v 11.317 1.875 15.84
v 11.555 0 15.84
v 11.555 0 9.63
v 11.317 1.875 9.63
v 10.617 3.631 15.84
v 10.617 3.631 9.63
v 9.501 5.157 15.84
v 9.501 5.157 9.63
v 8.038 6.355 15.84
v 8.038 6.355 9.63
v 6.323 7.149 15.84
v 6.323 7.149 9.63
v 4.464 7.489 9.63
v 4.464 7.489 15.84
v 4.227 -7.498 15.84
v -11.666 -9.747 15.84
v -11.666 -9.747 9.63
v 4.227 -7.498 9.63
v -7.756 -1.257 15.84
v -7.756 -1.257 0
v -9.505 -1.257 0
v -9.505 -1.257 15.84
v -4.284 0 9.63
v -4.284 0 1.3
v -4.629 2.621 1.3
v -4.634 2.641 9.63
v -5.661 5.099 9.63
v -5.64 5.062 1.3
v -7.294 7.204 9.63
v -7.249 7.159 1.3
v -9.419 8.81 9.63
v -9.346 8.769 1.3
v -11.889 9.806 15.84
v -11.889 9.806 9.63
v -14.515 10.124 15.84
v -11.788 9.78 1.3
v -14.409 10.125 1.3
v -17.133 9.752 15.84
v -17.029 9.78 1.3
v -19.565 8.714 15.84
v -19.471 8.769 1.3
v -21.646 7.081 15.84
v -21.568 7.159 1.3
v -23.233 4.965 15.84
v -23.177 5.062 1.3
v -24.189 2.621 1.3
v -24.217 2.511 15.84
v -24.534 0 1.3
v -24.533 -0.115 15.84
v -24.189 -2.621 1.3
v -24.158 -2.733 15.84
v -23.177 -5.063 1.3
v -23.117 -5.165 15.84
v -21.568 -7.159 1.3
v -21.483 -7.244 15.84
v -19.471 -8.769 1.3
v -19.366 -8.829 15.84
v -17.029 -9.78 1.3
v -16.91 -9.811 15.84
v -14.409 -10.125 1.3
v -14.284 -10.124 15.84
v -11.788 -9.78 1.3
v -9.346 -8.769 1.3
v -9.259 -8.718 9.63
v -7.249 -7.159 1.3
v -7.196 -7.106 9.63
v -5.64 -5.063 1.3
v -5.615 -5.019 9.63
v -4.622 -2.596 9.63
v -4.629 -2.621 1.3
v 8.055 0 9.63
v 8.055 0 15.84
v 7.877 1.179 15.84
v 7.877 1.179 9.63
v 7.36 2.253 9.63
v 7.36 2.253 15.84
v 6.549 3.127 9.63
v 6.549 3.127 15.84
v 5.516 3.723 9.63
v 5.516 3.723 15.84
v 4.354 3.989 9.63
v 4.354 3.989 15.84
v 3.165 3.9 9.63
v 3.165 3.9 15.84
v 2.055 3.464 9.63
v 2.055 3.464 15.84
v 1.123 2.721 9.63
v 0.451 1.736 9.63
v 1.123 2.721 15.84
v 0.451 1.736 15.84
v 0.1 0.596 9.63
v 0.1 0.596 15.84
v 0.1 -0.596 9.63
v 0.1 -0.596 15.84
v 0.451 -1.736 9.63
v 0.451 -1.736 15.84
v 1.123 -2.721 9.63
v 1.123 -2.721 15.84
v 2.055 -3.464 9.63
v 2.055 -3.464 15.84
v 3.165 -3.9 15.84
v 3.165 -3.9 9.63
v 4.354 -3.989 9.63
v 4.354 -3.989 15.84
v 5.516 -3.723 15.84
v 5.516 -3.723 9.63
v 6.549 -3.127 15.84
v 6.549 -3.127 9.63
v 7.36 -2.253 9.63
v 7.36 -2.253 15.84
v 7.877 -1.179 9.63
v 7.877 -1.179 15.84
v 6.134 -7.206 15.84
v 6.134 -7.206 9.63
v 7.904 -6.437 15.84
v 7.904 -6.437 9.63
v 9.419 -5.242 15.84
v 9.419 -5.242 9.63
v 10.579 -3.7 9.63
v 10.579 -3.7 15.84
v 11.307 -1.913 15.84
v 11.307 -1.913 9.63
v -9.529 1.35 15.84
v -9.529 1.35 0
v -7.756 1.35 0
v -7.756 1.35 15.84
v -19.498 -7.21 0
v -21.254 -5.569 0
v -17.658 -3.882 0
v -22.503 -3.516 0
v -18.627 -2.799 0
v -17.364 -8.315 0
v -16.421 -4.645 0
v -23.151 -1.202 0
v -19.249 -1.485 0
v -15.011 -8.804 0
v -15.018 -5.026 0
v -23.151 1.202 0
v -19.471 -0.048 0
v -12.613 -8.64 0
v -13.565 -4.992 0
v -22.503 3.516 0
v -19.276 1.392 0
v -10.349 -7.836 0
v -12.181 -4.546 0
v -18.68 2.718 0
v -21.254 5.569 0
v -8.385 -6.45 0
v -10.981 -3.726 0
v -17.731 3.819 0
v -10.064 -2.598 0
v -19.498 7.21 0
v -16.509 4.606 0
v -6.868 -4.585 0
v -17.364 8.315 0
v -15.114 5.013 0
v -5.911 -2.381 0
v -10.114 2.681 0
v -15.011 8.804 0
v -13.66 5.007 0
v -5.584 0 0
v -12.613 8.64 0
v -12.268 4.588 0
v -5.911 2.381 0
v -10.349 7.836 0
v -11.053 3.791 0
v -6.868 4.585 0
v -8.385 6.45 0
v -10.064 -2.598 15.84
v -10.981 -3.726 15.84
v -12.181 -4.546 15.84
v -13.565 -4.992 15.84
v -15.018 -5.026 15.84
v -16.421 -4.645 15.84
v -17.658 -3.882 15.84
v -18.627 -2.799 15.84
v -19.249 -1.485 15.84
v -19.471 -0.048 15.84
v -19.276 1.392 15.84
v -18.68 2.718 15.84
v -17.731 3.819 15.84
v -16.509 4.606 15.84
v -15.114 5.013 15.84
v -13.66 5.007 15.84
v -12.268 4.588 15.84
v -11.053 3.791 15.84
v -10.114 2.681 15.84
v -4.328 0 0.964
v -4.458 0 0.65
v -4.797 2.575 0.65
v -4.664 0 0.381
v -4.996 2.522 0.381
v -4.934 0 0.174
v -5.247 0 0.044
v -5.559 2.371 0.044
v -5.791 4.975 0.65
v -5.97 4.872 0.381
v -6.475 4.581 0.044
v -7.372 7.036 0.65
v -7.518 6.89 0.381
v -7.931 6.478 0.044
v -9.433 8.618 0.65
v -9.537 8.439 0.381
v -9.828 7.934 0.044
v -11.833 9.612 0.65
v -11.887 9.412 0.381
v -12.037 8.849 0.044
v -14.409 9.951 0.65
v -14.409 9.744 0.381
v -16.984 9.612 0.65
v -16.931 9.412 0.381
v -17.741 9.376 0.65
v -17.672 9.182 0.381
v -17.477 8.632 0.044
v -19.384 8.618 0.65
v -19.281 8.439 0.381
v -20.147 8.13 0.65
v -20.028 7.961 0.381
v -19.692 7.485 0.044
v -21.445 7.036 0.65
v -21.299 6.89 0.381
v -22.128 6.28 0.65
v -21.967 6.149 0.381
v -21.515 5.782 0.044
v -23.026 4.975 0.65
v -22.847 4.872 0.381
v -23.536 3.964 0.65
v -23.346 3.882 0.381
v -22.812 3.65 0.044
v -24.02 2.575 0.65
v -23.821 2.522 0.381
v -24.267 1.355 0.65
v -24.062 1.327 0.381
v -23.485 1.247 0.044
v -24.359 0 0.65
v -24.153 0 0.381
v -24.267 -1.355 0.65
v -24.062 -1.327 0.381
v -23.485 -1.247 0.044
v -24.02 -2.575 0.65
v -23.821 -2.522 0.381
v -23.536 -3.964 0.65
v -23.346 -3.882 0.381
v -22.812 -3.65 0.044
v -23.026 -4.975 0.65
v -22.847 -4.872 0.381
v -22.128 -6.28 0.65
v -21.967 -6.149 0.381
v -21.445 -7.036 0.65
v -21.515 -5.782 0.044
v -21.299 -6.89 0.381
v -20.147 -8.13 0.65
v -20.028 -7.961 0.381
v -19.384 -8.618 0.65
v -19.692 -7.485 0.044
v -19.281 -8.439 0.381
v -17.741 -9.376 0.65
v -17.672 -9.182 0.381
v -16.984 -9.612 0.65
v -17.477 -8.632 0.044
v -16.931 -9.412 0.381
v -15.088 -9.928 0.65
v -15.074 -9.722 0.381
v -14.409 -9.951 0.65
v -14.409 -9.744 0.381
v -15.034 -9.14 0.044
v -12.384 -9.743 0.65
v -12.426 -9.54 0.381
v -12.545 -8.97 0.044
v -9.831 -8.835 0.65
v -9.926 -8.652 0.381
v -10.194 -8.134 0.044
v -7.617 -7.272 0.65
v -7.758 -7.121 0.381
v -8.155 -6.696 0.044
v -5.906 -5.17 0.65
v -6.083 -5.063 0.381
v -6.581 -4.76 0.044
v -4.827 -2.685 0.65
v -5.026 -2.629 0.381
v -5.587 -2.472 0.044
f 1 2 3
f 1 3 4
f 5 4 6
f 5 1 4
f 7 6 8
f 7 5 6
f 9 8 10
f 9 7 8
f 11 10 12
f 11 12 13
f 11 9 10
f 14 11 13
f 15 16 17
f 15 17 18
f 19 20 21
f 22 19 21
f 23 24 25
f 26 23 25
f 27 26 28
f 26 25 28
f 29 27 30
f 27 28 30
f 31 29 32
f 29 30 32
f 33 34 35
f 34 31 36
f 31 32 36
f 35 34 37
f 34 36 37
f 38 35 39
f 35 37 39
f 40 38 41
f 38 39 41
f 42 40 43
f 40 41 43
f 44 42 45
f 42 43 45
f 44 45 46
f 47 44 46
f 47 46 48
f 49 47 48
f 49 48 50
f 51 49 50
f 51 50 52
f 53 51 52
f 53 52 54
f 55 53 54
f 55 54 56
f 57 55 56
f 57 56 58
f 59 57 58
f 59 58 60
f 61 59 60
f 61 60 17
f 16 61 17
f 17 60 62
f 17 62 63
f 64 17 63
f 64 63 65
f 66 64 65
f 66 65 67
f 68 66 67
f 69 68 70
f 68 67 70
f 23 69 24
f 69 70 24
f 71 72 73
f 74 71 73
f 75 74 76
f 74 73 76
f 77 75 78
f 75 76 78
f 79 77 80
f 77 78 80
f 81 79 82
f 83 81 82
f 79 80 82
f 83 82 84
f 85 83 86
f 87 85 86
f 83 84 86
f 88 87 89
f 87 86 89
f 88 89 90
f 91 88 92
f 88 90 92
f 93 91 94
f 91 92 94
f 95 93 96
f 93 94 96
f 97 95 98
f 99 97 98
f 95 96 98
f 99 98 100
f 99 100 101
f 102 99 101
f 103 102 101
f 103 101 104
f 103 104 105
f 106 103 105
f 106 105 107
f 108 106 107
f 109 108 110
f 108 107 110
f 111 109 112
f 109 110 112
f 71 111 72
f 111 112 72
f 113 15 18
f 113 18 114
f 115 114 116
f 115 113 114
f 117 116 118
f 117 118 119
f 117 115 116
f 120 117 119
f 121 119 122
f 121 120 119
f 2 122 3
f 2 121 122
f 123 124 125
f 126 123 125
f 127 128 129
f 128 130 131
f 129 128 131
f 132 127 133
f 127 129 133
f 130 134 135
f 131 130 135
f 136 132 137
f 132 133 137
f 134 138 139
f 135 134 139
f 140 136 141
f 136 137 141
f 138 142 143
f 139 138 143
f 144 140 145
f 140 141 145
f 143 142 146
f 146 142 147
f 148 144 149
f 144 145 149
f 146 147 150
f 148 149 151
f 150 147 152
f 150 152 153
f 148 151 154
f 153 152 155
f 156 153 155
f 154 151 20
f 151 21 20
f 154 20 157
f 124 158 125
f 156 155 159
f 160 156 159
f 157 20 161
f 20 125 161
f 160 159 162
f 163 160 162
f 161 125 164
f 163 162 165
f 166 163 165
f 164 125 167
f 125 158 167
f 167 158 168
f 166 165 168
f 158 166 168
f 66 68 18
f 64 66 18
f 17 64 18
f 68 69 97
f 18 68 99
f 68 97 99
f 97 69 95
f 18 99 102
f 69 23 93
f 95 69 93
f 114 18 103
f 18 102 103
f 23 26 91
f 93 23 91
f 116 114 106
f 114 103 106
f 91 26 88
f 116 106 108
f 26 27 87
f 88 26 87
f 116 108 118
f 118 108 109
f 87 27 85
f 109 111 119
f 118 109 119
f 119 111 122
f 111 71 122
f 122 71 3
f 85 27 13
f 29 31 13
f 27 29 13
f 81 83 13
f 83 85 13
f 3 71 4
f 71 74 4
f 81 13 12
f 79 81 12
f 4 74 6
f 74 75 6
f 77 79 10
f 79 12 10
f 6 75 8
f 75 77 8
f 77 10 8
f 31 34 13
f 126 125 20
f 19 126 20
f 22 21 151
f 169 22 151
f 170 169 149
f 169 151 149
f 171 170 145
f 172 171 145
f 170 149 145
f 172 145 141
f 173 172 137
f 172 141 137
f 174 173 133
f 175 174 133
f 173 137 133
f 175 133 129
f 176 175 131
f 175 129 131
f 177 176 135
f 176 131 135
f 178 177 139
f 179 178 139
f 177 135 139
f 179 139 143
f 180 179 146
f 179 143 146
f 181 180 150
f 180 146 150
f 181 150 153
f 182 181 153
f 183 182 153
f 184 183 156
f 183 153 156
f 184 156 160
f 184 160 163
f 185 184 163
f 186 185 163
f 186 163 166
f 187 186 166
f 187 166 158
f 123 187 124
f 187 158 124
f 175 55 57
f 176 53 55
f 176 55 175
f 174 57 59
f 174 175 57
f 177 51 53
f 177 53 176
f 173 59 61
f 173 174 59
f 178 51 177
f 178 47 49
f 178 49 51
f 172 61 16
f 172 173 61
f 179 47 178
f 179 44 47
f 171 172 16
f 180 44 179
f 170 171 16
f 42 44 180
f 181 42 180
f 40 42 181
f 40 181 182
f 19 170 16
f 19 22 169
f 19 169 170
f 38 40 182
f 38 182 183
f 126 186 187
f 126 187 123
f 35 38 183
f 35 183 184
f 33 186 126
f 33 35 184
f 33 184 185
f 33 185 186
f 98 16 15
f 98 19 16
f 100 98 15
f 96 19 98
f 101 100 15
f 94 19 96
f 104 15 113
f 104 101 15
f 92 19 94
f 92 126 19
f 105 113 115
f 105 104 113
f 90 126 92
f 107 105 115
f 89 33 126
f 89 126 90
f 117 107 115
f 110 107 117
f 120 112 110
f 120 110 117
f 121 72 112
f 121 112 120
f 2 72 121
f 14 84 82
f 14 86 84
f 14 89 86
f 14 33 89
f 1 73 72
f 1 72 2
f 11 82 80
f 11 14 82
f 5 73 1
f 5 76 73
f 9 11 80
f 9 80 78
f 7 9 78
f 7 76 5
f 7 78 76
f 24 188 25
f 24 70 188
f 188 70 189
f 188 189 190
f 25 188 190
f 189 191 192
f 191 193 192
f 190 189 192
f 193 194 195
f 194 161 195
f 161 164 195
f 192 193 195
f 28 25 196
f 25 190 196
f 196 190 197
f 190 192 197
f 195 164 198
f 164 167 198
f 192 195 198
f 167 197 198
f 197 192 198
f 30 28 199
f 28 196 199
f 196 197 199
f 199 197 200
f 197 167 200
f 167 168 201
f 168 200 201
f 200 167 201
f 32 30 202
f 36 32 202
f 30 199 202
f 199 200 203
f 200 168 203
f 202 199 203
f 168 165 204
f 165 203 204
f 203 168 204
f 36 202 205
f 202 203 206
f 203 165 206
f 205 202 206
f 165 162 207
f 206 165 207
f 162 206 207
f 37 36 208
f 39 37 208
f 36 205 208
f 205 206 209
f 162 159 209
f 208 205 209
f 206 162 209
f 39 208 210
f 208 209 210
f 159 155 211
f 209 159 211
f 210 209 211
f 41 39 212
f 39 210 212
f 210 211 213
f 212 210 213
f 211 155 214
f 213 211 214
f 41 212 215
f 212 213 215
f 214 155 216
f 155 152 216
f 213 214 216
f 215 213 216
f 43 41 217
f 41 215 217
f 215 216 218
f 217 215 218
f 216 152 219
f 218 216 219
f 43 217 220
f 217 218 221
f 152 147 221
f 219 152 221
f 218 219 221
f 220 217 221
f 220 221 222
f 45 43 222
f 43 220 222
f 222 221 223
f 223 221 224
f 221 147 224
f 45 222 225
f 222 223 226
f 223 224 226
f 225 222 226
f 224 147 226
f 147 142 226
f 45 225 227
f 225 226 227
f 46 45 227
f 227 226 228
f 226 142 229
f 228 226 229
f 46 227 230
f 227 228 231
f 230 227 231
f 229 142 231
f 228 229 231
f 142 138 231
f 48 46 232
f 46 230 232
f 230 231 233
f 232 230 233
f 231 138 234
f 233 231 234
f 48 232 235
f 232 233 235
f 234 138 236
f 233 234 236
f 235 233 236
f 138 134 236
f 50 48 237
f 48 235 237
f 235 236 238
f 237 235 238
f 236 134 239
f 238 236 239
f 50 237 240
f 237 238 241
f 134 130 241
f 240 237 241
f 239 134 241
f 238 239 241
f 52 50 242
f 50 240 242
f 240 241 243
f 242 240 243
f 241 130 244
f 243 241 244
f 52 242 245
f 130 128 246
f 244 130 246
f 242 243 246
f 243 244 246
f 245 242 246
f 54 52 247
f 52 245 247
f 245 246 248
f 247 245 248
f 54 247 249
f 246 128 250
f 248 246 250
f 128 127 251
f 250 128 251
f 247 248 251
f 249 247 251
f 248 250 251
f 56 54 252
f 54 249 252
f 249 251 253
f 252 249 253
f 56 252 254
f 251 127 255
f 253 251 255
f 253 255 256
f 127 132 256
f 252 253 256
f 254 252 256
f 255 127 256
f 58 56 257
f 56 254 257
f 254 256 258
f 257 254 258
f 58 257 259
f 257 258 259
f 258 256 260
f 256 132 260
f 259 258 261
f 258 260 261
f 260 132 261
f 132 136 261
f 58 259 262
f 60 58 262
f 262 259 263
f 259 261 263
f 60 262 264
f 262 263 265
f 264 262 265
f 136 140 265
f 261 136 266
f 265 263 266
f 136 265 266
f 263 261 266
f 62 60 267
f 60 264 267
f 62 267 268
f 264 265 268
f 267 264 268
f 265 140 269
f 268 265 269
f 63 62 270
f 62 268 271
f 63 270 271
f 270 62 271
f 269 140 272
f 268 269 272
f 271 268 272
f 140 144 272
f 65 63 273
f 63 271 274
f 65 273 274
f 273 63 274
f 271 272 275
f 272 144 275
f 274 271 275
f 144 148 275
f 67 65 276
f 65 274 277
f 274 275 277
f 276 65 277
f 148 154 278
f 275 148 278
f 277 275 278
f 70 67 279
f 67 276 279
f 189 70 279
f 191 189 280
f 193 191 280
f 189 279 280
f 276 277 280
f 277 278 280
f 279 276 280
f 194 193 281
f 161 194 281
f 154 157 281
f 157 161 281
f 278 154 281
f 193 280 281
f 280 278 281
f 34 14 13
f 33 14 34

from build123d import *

# Parameters (mm, degrees)
F0_R     = 10.125
F1_DEPTH = 15.84
F2_R     = 4
F3_DEPTH = 6.21
F4_R     = 1.3


with BuildPart() as f1:
    # F0 (on Top) → F1 (new body)
    with BuildSketch(Plane.XY):
        with Locations((-14.4086510164, 0)):
            Circle(F0_R)
        with BuildLine():
            ThreePointArc((-9.5045986008, -1.2566527585), (-19.4709204703, -0.0483138353), (-9.529476475, 1.3500229791))
            Line((-9.529476475, 1.3500229791), (-7.7556929707, 1.3500229791))
            Line((-7.7556929707, 1.3500229791), (-7.7556929707, -1.2566527585))
            Line((-7.7556929707, -1.2566527585), (-9.5045986008, -1.2566527585))
        make_face(mode=Mode.SUBTRACT)
    extrude(amount=F1_DEPTH)

    # F2 (on face) → F3 (join)
    with BuildSketch(Plane.XY.offset(15.84)):
        with BuildLine():
            ThreePointArc((4.2266686103, -7.4980342454), (9.4186281084, -5.2422426418), (11.5549640544, 0))
            ThreePointArc((11.5549640544, 0), (9.500818026, 5.1568085595), (4.4635841825, 7.4888603666))
            ThreePointArc((4.4635841825, 7.4888603666), (-3.4440990013, 0.1185465609), (4.2266686103, -7.4980342454))
        make_face()
        with Locations((4.0549640544, 0)):
            Circle(F2_R, mode=Mode.SUBTRACT)
        with BuildLine():
            ThreePointArc((4.2266686103, -7.4980342454), (-3.4440990013, 0.1185465609), (4.4635841825, 7.4888603666))
            Line((4.4635841825, 7.4888603666), (-11.8889977578, 9.8064760468))
            ThreePointArc((-11.8889977578, 9.8064760468), (-6.4078037412, 6.2050034551), (-4.2836510164, 0))
            ThreePointArc((-4.2836510164, 0), (-6.3377093937, -6.113552676), (-11.6664710308, -9.7465929394))
            Line((-11.6664710308, -9.7465929394), (4.2266686103, -7.4980342454))
        make_face()
    extrude(amount=-F3_DEPTH)

    # F4
    f4_edges = [f1.edges().sort_by_distance(p)[0] for p in [
        (-24.533651, 0, 0),
    ]]
    fillet(f4_edges, radius=F4_R)


solid = f1.part
